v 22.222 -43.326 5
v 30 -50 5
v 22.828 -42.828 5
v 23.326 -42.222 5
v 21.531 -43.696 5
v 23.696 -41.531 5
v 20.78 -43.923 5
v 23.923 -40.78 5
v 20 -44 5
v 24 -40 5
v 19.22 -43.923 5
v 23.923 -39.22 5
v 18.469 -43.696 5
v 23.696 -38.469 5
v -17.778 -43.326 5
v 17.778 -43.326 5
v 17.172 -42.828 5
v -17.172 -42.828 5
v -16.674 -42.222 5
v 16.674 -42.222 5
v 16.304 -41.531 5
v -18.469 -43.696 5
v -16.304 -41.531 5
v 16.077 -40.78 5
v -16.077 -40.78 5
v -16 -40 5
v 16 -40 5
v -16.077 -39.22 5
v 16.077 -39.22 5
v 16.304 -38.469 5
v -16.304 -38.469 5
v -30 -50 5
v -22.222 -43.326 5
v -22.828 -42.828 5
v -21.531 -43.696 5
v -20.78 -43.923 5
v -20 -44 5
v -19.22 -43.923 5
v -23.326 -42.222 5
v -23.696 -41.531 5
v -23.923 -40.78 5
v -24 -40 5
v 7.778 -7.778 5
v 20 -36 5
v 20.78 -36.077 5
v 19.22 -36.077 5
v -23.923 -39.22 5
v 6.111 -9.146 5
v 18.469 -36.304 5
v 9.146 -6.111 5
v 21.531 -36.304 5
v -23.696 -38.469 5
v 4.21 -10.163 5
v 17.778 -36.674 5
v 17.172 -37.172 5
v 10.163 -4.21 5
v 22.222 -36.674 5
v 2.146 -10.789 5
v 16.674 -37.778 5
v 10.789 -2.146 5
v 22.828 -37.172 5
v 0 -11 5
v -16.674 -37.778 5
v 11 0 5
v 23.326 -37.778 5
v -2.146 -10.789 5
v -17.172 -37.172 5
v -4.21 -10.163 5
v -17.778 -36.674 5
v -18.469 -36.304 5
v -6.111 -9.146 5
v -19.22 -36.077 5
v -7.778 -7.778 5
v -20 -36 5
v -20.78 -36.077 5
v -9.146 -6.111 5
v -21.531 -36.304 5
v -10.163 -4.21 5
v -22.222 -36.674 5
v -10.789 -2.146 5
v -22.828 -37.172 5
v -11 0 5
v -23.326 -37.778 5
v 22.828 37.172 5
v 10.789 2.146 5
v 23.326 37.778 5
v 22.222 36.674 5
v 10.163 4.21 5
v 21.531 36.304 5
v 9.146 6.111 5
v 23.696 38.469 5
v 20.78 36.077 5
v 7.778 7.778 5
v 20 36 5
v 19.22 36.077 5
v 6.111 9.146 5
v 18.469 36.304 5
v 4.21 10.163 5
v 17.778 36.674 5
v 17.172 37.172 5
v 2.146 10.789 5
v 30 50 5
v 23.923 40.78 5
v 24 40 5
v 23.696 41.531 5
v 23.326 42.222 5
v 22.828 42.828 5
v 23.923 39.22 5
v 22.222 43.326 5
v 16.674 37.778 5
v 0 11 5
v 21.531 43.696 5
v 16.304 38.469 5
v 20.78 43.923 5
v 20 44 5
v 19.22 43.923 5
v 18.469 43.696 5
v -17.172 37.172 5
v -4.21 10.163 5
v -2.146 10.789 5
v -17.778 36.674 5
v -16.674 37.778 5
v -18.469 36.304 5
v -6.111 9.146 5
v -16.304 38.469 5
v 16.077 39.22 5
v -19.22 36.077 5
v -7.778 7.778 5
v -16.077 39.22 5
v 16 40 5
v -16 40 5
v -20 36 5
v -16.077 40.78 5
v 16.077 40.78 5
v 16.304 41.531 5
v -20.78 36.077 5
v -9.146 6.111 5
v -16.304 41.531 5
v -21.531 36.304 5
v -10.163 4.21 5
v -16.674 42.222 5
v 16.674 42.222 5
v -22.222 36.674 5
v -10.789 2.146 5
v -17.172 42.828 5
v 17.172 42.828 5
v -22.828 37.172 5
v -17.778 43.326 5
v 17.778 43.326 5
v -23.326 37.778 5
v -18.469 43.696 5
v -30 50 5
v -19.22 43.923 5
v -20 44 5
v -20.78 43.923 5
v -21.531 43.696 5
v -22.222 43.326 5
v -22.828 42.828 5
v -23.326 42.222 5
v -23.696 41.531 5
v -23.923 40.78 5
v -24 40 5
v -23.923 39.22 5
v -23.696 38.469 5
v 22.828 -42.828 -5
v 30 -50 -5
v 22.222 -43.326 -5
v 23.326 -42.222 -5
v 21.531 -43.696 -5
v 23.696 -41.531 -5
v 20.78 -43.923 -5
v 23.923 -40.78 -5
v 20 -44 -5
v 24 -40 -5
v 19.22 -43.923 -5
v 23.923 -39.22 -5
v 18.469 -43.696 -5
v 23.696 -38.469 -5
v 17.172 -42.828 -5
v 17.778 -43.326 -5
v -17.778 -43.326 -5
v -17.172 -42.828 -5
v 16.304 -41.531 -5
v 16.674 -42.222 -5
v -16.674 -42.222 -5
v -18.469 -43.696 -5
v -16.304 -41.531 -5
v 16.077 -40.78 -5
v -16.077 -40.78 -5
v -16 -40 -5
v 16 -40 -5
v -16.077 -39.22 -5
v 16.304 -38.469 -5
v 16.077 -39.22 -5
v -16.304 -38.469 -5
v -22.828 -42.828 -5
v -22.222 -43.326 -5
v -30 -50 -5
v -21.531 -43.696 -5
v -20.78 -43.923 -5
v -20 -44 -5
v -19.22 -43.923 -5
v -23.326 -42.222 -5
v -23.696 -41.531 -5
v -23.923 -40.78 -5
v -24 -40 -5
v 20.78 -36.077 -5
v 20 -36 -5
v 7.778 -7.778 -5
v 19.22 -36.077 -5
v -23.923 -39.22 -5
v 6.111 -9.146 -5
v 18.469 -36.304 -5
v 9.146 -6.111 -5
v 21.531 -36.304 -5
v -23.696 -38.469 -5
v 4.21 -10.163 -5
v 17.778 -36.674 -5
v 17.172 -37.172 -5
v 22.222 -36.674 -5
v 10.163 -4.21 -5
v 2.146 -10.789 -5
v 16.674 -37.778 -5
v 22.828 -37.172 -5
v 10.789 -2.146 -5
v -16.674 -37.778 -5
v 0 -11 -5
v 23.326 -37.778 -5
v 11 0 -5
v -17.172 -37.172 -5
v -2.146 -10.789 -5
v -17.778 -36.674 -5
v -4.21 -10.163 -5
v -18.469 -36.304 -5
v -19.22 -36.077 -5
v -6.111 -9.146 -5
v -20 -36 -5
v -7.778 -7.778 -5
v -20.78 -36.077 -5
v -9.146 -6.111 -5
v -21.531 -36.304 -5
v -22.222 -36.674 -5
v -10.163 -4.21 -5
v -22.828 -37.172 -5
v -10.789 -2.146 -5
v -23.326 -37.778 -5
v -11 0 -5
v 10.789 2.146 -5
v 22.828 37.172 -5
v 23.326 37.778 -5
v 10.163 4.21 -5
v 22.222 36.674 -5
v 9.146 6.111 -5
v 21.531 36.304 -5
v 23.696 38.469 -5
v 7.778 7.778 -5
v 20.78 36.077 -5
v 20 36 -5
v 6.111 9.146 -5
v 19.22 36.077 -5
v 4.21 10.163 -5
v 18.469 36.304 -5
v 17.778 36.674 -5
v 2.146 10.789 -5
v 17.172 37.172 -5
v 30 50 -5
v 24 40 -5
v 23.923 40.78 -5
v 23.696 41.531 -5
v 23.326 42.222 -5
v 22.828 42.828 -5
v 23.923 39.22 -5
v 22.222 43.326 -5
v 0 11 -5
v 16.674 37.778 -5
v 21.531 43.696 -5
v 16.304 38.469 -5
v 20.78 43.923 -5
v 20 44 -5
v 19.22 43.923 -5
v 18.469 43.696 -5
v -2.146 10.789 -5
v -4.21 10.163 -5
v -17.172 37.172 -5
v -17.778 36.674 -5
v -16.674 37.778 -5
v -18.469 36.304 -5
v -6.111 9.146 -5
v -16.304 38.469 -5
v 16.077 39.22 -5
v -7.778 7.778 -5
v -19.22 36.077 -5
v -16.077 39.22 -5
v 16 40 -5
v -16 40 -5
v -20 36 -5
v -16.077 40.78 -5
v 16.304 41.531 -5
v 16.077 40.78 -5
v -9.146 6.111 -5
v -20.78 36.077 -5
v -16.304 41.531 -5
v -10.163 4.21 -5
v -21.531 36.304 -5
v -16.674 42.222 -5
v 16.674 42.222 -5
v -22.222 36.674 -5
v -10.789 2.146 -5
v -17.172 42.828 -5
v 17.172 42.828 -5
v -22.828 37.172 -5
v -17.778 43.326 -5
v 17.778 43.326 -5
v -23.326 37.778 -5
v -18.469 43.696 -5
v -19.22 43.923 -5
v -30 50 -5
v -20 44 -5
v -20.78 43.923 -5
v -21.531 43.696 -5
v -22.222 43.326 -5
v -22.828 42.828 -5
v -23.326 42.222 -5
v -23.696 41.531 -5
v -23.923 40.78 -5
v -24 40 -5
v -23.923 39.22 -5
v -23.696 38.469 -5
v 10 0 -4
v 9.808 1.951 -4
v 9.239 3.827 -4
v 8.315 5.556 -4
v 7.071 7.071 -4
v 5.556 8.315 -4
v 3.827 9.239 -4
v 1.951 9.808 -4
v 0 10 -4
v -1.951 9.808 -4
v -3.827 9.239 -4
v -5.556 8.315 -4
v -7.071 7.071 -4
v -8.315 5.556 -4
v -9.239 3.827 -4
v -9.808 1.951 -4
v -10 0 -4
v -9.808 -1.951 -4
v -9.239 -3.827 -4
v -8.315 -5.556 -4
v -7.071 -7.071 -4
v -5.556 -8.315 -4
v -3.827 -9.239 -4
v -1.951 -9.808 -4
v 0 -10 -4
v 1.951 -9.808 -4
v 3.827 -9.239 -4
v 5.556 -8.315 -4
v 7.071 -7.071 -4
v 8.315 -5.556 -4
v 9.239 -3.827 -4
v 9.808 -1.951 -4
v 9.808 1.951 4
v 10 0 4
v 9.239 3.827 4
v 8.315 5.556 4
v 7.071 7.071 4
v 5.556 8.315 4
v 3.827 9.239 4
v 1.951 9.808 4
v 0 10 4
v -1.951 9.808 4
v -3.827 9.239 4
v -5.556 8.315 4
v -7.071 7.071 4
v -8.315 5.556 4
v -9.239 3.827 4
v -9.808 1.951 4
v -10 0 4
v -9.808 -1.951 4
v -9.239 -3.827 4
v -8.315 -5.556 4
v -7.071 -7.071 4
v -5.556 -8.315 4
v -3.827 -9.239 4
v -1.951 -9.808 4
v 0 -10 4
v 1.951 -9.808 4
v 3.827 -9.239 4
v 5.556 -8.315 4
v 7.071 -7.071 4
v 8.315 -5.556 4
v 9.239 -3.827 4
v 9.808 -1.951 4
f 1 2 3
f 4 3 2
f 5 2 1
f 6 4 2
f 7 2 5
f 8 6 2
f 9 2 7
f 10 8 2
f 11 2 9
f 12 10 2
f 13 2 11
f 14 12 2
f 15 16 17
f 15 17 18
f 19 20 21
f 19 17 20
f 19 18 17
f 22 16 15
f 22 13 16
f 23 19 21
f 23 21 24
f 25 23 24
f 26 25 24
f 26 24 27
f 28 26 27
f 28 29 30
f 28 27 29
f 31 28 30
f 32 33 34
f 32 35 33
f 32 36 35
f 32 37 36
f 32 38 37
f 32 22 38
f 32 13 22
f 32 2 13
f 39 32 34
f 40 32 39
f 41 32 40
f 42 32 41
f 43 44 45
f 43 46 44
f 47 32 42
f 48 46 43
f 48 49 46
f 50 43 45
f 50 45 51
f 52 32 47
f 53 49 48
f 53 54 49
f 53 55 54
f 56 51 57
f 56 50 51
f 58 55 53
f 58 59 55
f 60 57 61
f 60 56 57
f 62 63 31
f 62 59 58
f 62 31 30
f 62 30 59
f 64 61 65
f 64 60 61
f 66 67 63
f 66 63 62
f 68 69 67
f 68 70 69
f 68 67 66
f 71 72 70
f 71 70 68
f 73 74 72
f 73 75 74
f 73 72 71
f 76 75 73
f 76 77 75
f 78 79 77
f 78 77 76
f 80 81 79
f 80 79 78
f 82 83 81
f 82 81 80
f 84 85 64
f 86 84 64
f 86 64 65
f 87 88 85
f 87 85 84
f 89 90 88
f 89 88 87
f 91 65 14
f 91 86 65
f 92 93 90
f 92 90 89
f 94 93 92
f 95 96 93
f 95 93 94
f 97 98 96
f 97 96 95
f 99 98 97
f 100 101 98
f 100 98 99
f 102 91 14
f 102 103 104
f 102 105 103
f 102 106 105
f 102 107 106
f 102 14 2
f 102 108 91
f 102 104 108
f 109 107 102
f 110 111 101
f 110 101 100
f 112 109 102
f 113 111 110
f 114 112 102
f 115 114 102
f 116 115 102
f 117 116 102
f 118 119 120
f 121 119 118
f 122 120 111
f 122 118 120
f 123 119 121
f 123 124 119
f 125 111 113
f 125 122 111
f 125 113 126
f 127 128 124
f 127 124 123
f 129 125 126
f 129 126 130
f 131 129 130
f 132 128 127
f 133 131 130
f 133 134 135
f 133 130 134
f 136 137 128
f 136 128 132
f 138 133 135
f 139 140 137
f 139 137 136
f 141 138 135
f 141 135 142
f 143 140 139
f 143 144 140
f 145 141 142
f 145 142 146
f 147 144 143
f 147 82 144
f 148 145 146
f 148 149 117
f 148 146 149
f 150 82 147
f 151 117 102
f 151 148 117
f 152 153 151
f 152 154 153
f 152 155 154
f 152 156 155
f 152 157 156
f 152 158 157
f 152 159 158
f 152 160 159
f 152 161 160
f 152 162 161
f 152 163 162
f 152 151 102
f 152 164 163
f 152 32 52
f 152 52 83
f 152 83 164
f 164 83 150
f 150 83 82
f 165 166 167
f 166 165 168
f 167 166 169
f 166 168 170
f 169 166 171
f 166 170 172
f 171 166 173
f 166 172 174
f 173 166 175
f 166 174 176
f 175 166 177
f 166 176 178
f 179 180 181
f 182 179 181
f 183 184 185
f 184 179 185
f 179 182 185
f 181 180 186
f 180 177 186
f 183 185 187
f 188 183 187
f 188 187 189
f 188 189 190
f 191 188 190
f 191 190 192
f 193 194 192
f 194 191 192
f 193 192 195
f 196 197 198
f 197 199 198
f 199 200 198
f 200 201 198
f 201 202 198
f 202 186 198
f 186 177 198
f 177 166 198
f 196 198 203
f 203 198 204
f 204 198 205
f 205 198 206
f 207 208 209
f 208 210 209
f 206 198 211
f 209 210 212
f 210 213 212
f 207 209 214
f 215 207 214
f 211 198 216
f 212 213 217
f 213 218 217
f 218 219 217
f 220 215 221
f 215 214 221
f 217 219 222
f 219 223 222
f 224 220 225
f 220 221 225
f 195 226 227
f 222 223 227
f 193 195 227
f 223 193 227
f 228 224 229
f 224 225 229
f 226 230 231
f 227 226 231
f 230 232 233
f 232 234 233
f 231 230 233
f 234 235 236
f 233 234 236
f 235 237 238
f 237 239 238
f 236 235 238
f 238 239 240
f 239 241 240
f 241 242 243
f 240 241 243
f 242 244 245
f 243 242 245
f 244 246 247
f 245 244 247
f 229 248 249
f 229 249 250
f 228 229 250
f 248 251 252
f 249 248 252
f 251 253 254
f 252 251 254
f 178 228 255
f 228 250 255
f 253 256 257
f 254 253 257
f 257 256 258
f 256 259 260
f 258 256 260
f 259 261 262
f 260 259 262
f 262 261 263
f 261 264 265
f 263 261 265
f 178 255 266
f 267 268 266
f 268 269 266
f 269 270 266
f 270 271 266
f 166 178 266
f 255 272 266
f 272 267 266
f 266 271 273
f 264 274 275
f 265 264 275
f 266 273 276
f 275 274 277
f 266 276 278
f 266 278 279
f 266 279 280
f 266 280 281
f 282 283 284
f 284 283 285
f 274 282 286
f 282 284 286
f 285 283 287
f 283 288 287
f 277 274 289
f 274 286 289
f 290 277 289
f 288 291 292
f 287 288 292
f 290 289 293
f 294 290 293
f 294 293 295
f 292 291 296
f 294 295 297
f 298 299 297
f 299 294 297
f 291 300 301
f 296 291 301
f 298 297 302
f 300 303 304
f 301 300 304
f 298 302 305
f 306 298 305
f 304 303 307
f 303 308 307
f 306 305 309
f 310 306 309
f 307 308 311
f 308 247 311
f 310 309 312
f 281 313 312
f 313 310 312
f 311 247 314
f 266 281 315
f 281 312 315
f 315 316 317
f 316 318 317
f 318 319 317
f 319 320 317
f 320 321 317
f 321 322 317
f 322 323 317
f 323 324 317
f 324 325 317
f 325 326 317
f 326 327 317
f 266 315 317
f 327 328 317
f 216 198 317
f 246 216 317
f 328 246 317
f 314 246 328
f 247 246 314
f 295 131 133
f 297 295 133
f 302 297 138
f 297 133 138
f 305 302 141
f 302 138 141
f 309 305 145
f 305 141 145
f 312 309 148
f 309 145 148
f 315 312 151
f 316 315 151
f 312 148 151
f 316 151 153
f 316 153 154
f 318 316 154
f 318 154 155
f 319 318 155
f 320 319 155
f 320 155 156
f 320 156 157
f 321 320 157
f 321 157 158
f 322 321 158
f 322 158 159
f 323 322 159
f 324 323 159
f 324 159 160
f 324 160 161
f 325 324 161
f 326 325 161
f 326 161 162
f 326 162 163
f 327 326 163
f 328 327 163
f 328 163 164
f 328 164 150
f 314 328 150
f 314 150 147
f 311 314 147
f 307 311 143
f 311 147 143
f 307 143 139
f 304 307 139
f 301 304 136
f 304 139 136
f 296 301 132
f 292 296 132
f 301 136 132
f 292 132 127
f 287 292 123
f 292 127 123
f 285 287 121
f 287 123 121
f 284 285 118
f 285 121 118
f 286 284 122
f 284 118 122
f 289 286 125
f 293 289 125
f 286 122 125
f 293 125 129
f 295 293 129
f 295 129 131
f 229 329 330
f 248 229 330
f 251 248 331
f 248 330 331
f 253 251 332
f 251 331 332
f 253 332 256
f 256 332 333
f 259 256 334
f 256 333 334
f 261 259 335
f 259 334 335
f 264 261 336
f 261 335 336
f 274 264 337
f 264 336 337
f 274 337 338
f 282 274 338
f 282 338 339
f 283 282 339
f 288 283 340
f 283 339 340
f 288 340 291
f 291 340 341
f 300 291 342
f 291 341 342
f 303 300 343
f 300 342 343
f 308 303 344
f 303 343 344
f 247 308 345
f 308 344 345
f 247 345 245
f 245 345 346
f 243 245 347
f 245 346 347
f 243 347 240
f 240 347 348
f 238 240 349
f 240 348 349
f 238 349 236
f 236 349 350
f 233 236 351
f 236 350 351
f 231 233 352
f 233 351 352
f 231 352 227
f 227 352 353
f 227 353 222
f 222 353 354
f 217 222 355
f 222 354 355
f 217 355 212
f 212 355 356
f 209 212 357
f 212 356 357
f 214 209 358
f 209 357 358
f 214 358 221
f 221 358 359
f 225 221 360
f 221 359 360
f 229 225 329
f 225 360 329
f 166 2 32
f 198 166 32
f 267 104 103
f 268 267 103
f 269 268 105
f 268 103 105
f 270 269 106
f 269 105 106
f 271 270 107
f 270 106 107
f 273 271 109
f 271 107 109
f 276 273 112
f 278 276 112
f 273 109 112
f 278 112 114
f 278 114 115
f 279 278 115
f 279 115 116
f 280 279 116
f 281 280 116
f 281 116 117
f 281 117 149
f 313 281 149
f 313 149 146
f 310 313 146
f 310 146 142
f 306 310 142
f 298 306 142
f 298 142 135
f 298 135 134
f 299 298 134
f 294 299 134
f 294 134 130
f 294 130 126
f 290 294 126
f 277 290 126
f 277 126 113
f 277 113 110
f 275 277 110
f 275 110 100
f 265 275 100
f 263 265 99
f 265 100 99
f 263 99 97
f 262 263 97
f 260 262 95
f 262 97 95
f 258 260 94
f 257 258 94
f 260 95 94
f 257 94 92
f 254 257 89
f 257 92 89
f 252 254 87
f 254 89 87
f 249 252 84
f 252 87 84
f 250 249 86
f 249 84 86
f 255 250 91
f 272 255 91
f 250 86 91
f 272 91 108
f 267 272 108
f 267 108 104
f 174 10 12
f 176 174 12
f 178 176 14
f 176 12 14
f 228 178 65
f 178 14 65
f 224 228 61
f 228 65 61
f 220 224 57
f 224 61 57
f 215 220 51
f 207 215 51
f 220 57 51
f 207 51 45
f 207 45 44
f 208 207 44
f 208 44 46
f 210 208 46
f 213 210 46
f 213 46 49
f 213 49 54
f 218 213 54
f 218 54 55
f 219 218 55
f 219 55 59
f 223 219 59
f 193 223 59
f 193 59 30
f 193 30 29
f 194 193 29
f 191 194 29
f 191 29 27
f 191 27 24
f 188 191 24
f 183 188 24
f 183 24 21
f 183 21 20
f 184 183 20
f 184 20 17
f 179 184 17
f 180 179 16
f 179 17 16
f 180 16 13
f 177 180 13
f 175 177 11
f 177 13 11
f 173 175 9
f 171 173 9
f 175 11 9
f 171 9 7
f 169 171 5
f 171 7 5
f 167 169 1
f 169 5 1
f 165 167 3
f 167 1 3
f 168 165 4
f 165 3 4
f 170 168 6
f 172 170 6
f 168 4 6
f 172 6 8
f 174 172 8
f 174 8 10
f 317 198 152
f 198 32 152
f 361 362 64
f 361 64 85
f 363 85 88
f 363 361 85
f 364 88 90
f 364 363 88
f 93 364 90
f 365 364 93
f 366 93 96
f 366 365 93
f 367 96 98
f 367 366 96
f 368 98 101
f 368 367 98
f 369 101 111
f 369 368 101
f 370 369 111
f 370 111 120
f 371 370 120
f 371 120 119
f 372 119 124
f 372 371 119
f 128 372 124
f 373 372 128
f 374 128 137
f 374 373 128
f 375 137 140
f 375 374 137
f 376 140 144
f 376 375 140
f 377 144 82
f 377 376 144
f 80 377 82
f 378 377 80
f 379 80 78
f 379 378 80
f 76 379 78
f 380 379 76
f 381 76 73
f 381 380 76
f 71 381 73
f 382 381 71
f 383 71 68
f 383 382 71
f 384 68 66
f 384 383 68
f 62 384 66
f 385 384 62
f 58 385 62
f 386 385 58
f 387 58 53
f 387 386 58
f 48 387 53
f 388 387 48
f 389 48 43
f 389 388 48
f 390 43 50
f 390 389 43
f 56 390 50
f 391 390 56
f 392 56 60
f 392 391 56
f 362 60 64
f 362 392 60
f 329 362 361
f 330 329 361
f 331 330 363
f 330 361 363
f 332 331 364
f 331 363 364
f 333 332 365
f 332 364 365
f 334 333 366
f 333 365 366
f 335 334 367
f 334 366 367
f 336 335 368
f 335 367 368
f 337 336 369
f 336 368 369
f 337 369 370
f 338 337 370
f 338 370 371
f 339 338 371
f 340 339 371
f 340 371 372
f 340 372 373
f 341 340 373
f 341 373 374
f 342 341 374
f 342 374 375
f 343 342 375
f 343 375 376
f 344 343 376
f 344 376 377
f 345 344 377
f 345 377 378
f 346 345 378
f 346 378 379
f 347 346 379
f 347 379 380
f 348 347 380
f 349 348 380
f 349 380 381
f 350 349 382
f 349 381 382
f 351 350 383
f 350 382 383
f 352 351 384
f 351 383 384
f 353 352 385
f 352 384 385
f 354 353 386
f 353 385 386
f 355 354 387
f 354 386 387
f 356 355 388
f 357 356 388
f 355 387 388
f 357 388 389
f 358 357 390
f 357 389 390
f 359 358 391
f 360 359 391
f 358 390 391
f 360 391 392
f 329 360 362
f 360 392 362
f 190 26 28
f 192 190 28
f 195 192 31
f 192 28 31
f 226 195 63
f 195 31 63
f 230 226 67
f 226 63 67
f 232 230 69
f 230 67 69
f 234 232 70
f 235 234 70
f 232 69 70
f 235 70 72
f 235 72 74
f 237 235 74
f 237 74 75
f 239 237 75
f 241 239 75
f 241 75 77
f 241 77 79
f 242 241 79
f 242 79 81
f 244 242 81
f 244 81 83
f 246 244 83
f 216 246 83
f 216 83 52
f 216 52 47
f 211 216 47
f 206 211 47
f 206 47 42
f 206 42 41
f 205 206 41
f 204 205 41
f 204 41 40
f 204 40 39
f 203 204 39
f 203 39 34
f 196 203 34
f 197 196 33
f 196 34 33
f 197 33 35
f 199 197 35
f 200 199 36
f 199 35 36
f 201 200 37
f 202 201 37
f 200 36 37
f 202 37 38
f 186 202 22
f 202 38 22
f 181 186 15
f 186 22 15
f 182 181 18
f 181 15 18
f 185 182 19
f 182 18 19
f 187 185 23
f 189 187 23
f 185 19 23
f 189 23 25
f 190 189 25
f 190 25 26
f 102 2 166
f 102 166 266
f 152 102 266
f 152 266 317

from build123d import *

# Parameters (mm, degrees)
SKETCH1_W           = 100
SKETCH1_H           = 60
BOSS_EXTRUDE1_DEPTH = 5
CUT_EXTRUDE2_START  = 5
SKETCH2_R           = 4
CUT_EXTRUDE2_DEPTH  = 64.523499554
CUT_EXTRUDE4_START  = 5
SKETCH3_R           = 10
CUT_EXTRUDE4_DEPTH  = 64.523499554
CHAMFER1_SIZE       = 1


with BuildPart() as part:
    # Sketch1 → Boss-Extrude1 (new, symmetric)
    with BuildSketch(Plane(origin=(0, 0, 0), x_dir=(0, 1, 0), z_dir=(0, 0, 1))):
        Rectangle(SKETCH1_W, SKETCH1_H)
    extrude(amount=BOSS_EXTRUDE1_DEPTH, both=True)

    # Sketch2 → Cut-Extrude2 (cut, through all)
    with BuildSketch(Plane(origin=(0, 0, 0), x_dir=(0, 1, 0), z_dir=(0, 0, 1)).offset(CUT_EXTRUDE2_START)):
        with Locations(Location((-40, -20, 0), (0, 0, 270))):
            Circle(SKETCH2_R)
        with Locations(Location((40, -20, 0), (0, 0, 270))):
            Circle(SKETCH2_R)
        with Locations(Location((-40, 20, 0), (0, 0, 270))):
            Circle(SKETCH2_R)
        with Locations(Location((40, 20, 0), (0, 0, 270))):
            Circle(SKETCH2_R)
    extrude(amount=-CUT_EXTRUDE2_DEPTH, mode=Mode.SUBTRACT)

    # Sketch3 → Cut-Extrude4 (cut, through all)
    with BuildSketch(Plane(origin=(0, 0, 0), x_dir=(0, 1, 0), z_dir=(0, 0, 1)).offset(CUT_EXTRUDE4_START)):
        with Locations(Location((0, 0, 0), (0, 0, 270))):
            Circle(SKETCH3_R)
    extrude(amount=-CUT_EXTRUDE4_DEPTH, mode=Mode.SUBTRACT)

    # Chamfer1
    chamfer1_edges = [part.edges().sort_by_distance(p)[0] for p in [
        (-10, 0, -5),
        (-10, 0, 5),
    ]]
    chamfer(chamfer1_edges, length=CHAMFER1_SIZE)


solid = part.part
